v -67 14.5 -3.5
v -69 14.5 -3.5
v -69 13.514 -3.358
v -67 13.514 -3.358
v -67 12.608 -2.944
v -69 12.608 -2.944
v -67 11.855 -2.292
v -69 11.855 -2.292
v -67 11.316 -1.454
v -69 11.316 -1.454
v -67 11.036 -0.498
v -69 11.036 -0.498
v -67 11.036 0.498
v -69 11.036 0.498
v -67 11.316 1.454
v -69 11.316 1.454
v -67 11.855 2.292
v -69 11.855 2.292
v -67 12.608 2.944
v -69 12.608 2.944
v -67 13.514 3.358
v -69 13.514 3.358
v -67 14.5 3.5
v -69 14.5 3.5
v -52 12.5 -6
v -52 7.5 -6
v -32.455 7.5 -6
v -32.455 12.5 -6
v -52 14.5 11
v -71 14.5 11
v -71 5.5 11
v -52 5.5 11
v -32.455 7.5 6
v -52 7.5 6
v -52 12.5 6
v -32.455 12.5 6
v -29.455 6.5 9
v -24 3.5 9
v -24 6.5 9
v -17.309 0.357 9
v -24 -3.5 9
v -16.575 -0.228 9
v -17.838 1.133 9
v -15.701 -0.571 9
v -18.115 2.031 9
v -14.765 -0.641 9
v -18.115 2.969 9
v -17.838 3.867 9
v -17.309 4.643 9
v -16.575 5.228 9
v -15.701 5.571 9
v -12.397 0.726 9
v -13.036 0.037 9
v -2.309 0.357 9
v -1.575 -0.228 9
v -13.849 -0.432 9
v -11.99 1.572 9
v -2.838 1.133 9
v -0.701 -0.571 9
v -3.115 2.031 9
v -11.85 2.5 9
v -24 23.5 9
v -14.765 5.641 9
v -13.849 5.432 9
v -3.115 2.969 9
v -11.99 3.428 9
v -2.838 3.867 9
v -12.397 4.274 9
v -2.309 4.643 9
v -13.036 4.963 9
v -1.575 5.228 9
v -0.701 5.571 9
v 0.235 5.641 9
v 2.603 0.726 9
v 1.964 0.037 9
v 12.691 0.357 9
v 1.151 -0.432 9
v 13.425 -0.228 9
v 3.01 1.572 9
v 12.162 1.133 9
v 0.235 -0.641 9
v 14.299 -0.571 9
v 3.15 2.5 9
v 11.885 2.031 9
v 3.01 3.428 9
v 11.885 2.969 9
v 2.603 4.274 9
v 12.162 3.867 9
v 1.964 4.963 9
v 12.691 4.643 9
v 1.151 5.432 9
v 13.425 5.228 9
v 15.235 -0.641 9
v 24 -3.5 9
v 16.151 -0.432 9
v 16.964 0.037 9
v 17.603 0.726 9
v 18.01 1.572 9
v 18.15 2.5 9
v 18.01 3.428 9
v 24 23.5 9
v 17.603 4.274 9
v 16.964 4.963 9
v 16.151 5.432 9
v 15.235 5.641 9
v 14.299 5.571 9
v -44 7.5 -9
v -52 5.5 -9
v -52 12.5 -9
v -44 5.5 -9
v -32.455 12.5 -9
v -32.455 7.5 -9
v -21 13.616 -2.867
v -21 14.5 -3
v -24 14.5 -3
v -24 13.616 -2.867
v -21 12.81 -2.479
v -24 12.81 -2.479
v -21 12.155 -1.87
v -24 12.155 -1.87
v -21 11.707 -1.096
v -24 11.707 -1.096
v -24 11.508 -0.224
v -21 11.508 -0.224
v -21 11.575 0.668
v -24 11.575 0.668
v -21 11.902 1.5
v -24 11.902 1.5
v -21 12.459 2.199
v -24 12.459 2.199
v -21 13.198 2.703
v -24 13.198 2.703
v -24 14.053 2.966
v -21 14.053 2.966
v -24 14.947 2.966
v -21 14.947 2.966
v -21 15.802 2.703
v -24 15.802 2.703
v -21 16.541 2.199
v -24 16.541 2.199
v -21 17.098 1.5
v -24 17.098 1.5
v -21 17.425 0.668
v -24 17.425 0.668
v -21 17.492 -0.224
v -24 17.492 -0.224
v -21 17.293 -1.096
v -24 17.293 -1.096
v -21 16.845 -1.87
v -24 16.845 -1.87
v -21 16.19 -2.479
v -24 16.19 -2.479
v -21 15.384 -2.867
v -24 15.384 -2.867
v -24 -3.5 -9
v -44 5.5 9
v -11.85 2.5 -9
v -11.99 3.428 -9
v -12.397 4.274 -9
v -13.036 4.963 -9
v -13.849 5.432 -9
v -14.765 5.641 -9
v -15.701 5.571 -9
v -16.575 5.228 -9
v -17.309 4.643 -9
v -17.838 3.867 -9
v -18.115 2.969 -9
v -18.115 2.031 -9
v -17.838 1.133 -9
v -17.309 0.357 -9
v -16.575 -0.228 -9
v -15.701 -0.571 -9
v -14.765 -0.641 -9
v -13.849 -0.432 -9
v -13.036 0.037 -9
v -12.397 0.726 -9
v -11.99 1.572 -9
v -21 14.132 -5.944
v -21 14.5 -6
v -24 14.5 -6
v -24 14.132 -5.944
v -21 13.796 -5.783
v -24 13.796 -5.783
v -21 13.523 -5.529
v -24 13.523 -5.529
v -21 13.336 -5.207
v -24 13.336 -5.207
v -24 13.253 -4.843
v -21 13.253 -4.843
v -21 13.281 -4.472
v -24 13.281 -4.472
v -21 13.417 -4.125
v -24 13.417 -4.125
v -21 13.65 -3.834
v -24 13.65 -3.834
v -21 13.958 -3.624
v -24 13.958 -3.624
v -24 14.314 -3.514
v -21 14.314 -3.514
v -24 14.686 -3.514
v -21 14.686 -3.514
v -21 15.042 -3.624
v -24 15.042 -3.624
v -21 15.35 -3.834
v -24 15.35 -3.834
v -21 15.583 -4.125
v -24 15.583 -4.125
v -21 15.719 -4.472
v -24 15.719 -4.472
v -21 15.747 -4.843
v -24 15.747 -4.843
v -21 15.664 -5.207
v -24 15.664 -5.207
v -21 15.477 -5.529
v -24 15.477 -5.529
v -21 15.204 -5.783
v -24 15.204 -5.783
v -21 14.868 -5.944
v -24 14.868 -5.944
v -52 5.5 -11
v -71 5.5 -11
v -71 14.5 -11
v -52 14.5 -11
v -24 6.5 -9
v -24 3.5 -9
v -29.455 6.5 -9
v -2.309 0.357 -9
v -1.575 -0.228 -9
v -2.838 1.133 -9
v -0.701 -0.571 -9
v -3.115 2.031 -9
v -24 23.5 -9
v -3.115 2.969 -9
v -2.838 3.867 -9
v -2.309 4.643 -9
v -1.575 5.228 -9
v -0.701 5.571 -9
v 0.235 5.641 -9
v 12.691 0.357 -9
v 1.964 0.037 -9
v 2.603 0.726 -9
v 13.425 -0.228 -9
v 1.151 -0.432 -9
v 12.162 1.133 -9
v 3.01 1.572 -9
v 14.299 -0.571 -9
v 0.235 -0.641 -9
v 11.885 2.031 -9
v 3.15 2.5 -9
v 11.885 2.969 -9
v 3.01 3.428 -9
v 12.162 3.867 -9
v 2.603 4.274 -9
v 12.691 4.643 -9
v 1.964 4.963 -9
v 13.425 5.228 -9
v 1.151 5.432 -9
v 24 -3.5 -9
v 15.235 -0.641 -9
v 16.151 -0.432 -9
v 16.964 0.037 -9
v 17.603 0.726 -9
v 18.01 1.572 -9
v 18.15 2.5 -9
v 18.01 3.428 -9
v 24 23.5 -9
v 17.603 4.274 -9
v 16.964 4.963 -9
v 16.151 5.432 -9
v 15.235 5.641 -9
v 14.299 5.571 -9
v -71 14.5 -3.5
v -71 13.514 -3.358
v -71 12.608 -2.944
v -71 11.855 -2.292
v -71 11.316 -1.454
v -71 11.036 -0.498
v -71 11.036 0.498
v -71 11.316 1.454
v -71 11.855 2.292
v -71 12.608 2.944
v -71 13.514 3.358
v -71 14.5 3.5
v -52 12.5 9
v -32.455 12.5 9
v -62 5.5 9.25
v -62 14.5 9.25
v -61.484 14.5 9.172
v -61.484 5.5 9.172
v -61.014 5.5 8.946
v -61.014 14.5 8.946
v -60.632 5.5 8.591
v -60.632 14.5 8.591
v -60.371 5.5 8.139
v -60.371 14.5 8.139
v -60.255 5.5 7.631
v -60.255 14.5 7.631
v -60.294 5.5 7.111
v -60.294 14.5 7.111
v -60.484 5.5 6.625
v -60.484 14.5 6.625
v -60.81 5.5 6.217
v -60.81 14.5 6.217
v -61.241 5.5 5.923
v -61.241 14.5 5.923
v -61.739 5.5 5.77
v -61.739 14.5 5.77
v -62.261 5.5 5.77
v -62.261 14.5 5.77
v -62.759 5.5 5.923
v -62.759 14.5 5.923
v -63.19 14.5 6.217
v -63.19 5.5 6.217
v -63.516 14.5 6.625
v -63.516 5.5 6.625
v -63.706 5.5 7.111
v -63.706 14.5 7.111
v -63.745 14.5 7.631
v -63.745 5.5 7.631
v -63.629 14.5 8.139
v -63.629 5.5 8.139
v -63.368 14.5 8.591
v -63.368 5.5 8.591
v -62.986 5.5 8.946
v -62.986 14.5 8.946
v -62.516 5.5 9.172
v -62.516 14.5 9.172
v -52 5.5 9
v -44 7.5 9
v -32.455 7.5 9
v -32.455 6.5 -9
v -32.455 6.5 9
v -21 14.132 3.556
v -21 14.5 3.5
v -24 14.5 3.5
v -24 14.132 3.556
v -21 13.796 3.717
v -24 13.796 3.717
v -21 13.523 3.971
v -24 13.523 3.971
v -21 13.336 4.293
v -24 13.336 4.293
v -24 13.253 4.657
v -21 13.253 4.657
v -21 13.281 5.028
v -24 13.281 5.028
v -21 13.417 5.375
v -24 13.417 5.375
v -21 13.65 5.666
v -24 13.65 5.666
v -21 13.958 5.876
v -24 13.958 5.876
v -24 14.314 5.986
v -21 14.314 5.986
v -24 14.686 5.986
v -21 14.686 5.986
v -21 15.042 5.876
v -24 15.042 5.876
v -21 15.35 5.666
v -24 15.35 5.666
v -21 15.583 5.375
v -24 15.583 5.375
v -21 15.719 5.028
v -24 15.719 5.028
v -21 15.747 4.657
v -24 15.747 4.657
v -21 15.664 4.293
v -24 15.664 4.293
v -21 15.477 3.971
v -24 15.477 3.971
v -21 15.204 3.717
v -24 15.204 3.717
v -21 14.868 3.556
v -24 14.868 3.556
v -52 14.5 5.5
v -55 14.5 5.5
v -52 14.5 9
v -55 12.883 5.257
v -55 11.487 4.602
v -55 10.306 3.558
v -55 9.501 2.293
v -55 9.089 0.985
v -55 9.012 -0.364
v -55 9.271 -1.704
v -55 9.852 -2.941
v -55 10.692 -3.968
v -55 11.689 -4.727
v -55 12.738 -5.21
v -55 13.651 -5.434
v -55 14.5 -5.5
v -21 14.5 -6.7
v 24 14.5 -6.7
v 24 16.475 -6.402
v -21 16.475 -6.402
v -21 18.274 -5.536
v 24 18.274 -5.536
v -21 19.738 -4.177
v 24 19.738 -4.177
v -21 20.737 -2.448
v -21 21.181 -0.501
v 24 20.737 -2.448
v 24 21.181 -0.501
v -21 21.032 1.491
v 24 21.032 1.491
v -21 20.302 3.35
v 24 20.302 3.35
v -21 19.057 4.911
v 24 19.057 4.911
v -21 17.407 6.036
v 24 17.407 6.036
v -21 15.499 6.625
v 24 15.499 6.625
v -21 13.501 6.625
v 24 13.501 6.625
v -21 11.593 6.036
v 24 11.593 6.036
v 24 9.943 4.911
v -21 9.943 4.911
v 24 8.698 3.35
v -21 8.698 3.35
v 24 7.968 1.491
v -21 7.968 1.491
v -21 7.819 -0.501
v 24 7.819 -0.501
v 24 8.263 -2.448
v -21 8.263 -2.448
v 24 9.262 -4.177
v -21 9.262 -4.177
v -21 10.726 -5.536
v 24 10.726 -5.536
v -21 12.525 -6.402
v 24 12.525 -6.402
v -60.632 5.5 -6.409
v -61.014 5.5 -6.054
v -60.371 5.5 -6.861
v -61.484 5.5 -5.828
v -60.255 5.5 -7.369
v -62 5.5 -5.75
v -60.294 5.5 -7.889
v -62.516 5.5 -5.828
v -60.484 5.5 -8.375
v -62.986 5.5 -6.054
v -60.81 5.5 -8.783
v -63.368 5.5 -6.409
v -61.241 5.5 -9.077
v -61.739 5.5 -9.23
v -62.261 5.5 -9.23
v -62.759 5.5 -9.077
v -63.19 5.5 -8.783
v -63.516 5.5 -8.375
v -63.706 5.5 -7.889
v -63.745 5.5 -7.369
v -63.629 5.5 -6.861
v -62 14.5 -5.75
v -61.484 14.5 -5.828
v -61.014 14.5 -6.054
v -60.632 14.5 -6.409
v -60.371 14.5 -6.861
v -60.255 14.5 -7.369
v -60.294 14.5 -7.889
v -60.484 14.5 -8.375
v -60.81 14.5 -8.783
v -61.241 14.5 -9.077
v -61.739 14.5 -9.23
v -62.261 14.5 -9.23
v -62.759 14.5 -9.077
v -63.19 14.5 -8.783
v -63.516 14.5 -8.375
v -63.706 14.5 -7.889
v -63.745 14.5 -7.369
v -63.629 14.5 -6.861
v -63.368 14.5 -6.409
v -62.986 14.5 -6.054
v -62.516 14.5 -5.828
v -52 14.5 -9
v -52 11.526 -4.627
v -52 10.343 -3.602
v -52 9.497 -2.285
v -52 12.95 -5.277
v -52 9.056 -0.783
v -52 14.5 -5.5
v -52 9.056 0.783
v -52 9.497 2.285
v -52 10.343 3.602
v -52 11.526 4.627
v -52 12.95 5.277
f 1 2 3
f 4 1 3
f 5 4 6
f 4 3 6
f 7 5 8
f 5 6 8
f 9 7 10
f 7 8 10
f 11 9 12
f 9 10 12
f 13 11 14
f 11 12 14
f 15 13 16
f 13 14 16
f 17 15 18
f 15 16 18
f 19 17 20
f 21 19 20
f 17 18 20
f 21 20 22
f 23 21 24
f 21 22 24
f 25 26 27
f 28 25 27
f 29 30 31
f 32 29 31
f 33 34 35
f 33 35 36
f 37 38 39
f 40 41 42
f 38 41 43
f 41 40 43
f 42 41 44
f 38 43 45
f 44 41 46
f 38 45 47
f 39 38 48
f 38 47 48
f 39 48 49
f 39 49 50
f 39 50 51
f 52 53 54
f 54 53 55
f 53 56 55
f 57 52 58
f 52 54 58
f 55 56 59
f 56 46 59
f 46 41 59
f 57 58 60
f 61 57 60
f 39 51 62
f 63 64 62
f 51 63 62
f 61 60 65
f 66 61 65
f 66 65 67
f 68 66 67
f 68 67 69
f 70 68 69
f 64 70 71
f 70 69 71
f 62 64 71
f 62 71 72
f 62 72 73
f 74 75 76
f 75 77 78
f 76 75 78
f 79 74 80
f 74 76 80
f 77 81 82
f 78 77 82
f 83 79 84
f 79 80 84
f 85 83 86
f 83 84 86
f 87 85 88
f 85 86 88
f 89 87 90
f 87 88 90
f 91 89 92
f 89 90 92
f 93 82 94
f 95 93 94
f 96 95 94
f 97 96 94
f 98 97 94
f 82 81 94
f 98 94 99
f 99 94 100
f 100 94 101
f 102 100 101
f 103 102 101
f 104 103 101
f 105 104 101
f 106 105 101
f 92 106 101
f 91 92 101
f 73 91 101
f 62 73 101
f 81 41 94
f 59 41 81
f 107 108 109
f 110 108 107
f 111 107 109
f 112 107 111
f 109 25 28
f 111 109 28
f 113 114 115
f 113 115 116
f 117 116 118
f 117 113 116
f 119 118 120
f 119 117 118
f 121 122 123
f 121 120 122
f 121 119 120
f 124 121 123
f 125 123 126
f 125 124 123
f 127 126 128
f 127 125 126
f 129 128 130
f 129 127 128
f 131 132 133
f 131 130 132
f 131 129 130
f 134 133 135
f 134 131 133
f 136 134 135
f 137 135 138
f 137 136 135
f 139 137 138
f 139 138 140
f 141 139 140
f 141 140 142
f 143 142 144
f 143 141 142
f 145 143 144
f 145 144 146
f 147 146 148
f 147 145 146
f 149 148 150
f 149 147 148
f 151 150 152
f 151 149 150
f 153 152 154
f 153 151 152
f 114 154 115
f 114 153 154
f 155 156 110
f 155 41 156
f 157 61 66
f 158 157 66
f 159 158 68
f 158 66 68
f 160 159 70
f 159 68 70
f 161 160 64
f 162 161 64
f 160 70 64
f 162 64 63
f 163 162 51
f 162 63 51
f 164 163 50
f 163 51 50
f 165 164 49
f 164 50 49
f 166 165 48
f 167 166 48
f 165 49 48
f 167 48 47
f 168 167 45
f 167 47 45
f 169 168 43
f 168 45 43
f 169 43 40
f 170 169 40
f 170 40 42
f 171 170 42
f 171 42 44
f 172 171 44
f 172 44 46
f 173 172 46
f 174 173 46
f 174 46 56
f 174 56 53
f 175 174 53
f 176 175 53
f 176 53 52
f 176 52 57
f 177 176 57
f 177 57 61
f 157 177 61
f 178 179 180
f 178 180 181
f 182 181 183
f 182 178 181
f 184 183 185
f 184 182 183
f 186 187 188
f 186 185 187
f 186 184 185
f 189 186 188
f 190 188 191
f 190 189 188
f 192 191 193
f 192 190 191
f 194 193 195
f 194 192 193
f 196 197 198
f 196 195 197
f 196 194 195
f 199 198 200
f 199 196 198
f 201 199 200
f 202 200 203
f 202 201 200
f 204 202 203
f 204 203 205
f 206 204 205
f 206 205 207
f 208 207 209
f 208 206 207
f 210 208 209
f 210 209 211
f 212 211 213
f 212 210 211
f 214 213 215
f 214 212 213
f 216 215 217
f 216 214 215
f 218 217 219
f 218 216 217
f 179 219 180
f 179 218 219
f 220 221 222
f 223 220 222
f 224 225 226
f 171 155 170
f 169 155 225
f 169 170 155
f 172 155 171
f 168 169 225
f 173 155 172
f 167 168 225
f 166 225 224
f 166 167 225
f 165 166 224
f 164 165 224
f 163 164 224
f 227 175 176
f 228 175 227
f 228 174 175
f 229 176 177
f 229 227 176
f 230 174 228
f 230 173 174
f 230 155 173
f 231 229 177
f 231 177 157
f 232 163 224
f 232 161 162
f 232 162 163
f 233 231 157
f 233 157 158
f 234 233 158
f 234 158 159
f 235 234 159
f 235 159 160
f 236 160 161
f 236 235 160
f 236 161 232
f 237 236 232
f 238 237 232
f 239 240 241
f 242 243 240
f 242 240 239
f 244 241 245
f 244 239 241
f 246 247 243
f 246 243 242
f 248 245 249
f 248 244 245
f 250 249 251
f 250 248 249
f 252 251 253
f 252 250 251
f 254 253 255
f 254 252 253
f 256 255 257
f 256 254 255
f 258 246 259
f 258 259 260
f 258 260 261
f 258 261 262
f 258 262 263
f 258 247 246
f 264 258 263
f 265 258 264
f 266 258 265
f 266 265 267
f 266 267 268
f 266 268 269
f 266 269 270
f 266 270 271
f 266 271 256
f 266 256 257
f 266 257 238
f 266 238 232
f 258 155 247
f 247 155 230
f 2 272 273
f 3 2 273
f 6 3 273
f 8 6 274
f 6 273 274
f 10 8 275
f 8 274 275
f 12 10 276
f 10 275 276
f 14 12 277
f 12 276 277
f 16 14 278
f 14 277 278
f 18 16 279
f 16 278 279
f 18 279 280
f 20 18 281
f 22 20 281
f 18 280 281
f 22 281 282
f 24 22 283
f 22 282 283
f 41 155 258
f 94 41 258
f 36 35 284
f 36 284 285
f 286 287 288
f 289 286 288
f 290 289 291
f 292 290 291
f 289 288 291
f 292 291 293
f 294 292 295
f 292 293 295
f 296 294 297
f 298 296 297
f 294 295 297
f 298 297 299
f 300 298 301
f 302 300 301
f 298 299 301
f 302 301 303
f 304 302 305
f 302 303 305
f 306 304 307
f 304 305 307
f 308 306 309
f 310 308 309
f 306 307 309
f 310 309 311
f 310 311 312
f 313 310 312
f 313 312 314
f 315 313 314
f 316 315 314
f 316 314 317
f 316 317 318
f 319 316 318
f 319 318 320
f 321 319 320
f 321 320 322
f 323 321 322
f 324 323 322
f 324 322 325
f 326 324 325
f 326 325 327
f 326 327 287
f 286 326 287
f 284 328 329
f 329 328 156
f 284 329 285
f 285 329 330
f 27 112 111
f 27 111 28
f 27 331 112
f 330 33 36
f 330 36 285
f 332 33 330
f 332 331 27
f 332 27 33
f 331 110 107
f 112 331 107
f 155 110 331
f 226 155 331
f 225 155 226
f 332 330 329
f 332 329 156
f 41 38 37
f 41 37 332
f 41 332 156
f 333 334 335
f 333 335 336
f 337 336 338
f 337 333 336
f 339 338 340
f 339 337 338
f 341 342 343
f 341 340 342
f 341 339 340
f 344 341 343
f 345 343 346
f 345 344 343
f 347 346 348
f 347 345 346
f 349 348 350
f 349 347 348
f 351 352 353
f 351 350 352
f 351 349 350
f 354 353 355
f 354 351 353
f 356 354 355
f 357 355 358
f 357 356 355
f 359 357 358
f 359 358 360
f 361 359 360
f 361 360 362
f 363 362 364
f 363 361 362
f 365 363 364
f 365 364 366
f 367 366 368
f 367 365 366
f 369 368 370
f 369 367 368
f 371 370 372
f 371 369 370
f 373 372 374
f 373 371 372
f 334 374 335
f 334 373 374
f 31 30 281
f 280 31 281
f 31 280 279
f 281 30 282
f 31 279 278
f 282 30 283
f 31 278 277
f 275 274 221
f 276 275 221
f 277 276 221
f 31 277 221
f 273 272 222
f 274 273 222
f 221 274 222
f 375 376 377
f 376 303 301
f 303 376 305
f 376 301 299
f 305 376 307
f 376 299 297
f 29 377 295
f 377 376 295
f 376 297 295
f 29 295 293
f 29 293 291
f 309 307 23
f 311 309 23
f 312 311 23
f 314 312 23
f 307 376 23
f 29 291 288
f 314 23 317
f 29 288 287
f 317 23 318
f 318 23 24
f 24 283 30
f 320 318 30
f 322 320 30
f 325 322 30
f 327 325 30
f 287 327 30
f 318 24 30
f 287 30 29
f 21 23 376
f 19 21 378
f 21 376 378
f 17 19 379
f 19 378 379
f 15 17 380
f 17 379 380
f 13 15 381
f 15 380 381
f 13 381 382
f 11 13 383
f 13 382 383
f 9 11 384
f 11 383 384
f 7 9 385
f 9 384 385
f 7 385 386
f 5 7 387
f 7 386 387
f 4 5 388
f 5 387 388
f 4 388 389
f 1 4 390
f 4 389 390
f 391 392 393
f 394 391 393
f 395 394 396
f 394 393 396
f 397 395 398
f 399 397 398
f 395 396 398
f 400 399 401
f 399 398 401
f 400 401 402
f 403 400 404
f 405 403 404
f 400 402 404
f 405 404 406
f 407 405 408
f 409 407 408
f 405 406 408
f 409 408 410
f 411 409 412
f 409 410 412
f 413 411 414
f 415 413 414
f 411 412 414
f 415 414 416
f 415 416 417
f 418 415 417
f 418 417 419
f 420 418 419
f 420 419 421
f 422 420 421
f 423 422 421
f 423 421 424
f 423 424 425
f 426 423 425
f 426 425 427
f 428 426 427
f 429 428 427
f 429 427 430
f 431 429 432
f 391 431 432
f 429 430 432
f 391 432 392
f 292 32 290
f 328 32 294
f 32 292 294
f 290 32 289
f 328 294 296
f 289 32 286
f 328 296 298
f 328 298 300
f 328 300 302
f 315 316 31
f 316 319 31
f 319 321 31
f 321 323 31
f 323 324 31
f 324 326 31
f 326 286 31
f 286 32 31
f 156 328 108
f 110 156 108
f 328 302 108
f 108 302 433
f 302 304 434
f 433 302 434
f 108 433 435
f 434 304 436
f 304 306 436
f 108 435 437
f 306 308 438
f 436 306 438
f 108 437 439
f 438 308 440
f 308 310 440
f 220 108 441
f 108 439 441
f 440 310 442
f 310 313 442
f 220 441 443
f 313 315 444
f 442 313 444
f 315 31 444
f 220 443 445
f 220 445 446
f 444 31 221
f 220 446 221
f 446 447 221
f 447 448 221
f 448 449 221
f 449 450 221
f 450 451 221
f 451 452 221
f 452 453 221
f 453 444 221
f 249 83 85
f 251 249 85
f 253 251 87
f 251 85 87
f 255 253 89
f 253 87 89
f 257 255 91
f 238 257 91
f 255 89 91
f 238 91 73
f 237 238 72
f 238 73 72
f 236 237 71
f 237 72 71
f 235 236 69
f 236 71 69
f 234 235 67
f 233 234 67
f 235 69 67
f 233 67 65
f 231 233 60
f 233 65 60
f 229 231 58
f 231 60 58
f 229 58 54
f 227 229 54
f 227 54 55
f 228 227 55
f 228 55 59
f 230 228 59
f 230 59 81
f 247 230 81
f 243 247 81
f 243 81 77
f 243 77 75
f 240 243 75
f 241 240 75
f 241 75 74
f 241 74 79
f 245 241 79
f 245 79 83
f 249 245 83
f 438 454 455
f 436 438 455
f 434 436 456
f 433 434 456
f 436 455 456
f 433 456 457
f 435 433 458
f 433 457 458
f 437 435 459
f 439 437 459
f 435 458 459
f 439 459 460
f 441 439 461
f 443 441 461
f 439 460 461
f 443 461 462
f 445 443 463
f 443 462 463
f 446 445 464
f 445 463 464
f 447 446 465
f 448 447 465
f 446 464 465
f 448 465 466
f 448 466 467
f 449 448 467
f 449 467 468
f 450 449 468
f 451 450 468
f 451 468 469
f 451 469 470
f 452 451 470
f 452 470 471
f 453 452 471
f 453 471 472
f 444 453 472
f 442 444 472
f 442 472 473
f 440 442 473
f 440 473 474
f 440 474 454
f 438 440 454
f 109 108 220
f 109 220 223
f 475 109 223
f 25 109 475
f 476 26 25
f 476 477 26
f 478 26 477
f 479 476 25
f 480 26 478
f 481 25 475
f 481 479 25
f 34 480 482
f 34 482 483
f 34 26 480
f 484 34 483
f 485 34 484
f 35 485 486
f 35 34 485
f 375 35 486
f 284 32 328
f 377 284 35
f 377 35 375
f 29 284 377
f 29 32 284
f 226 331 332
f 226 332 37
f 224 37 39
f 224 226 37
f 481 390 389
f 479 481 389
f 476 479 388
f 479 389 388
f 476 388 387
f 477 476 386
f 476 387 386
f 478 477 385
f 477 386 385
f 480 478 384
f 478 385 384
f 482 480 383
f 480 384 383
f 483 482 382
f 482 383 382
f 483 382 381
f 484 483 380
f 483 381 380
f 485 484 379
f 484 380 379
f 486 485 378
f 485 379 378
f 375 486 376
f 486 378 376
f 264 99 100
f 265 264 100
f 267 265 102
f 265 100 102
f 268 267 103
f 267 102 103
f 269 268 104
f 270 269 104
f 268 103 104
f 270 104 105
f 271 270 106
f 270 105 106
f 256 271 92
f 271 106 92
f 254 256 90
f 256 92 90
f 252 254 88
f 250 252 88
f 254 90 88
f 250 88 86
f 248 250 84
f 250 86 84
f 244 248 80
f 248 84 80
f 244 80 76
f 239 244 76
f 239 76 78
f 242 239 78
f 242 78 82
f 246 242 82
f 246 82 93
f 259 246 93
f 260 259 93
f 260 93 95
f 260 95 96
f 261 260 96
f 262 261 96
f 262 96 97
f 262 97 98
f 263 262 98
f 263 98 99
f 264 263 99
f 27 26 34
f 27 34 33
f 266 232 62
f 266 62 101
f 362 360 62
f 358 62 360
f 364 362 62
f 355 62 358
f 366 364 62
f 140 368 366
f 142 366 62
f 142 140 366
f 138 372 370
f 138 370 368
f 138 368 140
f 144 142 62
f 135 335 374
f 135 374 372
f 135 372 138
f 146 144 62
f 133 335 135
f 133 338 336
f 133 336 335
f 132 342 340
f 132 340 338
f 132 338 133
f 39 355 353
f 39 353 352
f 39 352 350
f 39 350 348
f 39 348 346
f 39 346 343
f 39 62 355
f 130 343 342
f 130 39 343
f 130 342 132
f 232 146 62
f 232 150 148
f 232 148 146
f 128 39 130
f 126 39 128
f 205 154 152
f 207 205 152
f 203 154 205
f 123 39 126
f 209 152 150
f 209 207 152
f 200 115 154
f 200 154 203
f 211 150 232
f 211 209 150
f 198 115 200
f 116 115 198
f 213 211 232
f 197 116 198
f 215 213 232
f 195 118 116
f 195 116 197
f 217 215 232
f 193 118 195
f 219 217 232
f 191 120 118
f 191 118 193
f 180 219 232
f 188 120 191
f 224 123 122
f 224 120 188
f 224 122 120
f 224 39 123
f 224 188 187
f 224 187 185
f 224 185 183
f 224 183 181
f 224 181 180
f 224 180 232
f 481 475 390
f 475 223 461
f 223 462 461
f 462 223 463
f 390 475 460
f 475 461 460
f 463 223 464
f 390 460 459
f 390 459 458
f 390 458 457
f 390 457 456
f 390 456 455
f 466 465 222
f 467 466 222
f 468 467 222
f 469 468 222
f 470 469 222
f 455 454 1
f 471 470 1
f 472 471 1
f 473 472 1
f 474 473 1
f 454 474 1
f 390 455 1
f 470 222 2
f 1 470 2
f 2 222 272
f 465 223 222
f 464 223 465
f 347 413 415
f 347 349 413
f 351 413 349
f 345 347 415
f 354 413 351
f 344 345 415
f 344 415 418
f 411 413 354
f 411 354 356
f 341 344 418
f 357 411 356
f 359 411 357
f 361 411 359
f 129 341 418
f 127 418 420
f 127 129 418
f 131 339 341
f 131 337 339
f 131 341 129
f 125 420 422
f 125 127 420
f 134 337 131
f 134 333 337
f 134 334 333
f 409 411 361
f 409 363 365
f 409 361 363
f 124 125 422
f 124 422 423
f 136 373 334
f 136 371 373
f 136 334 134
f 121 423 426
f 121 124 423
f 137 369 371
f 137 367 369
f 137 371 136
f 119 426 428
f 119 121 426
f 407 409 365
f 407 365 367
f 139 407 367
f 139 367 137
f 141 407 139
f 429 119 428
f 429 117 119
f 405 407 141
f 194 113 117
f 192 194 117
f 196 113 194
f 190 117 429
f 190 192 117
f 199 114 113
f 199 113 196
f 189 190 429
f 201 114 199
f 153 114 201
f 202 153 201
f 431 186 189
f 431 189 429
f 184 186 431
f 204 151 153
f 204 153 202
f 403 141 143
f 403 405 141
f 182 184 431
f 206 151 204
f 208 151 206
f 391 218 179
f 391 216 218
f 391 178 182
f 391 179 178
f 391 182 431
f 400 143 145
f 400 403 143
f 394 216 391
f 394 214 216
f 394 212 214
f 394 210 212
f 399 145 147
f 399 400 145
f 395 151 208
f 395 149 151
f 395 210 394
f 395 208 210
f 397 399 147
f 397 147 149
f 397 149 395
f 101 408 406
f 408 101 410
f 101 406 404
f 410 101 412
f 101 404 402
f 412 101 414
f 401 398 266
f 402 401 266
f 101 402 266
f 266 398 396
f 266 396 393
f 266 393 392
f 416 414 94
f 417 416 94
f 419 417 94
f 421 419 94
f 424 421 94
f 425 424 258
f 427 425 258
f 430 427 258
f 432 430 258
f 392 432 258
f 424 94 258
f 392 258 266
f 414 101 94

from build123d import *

# Parameters (mm, degrees)
SKETCH_1_W           = 48
SKETCH_1_H           = 18
EXTRUDE_1_DEPTH      = 3.5
SKETCH_6_W           = 18
SKETCH_6_H           = 9
EXTRUDE_4_DEPTH      = 25
SKETCH_7_R           = 3.5
CUT_EXTRUDE_1_DEPTH  = 2
SKETCH_9_R           = 5.5
CUT_EXTRUDE_4_DEPTH  = 3
EXTRUDE_5_OUTLINE_W  = 48
EXTRUDE_5_OUTLINE_H  = 18
EXTRUDE_5_DEPTH      = 20
CUT_EXTRUDE_7_REACH  = 98.344
SKETCH_13_R          = 3
SKETCH_13_R_2        = 1.25
SKETCH_15_R          = 6.7
CUT_EXTRUDE_8_DEPTH  = 45
SKETCH_16_R          = 3.15
CUT_EXTRUDE_9_DEPTH  = 76.081622399
EXTRUDE_6_REACH      = 56.196
SKETCH_17_W          = 18
SKETCH_17_H          = 3
SKETCH_18_W          = 14.545454545
SKETCH_18_H          = 18
EXTRUDE_7_DEPTH      = 2
SKETCH_19_W          = 22.545454545
SKETCH_19_H          = 18
CUT_EXTRUDE_11_DEPTH = 7
SKETCH_20_W          = 19.545454545
SKETCH_20_H          = 3
EXTRUDE_8_DEPTH      = 5
SKETCH_21_W          = 17
SKETCH_21_H          = 9
EXTRUDE_9_DEPTH      = 2
SKETCH_22_R          = 1.75
CUT_EXTRUDE_12_DEPTH = 73.152616166
SKETCH_24_W          = 3
SKETCH_24_H          = 18
CUT_EXTRUDE_13_DEPTH = 1
EXTRUDE_START        = 2
EXTRUDE_10_DEPTH     = 2


with BuildPart() as part:
    # 草圖1 → 填料-伸長1 (new, symmetric)
    with BuildSketch(Plane(origin=(0, 0, 0), x_dir=(1, 0, 0), z_dir=(0, 1, 0))):
        Rectangle(SKETCH_1_W, SKETCH_1_H)
    extrude(amount=EXTRUDE_1_DEPTH, both=True)

    # Sketch 3D_3 → Loft 1 section 0
    with BuildSketch(Plane(origin=(-44, 14.5, -9), x_dir=(0, -0.447213595499958, 0.894427190999916), z_dir=(-1, 0, 0))):
        with BuildLine():
            Line((0, 0), (16.099689438, 8.049844719))
            Line((16.099689438, 8.049844719), (20.124611797, 0))
            Line((20.124611797, 0), (4.024922359, -8.049844719))
            Line((4.024922359, -8.049844719), (0, 0))
        make_face()
    # 草圖5 → Loft 1 section 1
    with BuildSketch(Plane.ZY.offset(24)):
        with BuildLine():
            Line((-9, 3.5), (9, 3.5))
            Line((9, 3.5), (9, -3.5))
            Line((9, -3.5), (-9, -3.5))
            Line((-9, -3.5), (-9, 3.5))
        make_face()
    loft()

    # 草圖6 → 填料-伸長4 (add)
    with BuildSketch(Plane.ZY.offset(44)):
        with Locations((0, 10)):
            Rectangle(SKETCH_6_W, SKETCH_6_H)
    extrude(amount=EXTRUDE_4_DEPTH)

    # 草圖7 → 除料-伸長1 (cut)
    with BuildSketch(Plane.ZY.offset(69)):
        with Locations((0, 14.5)):
            Circle(SKETCH_7_R)
    extrude(amount=-CUT_EXTRUDE_1_DEPTH, mode=Mode.SUBTRACT)

    # Loft 1 2: read off the stored shape, not the designer's step
    # Loft 1 2: loft between two sections, ruled curve by curve
    loft_1_2_from = [
        Edge.make_bspline([(-67, 14.5, 3.5), (-67, 12.75, 3.5), (-67, 11, 2.333333333), (-67, 11, -2.333333333), (-67, 12.75, -3.5), (-67, 14.5, -3.5)], [0, 0, 0, 0, 0.5, 0.5, 1, 1, 1, 1], 3, [1, 0.666666667, 0.5, 0.5, 0.666666667, 1]),
        Edge.make_line((-67, 14.5, -3.5), (-67, 14.5, 3.5)),
    ]
    loft_1_2_to = [
        Edge.make_bspline([(-55, 15.833945938, 5.335783751), (-55, 12.063417219, 6.27841593), (-55, 9, 3.886572043), (-55, 9, -3.886572043), (-55, 12.063417219, -6.27841593), (-55, 15.833945938, -5.335783751)], [0, 0, 0, 0, 0.5, 0.5, 1, 1, 1, 1], 3, [1, 0.552953065, 0.4111804, 0.4111804, 0.552953065, 1]),
        Edge.make_line((-55, 15.833945938, -5.335783751), (-55, 15.833945938, 5.335783751)),
    ]
    loft_1_2 = Solid(Shell([*[Face.make_surface_from_curves(loft_1_2_from[k], loft_1_2_to[k]) for k in range(2)], Face(Wire(loft_1_2_from)), Face(Wire(loft_1_2_to))]))
    add(loft_1_2, mode=Mode.SUBTRACT)

    # 草圖9 → 除料-伸長4 (cut)
    with BuildSketch(Plane.ZY.offset(55)):
        with Locations((3.554e-06, 14.500000002)):
            Circle(SKETCH_9_R)
    extrude(amount=-CUT_EXTRUDE_4_DEPTH, mode=Mode.SUBTRACT)

    # 填料-伸長5: read off the stored shape, not the designer's step
    # 填料-伸長5 outline → 填料-伸長5 (add)
    with BuildSketch(Plane(origin=(0, 3.5, 0), x_dir=(1, 0, 0), z_dir=(0, 1, 0))):
        Rectangle(EXTRUDE_5_OUTLINE_W, EXTRUDE_5_OUTLINE_H)
    extrude(amount=EXTRUDE_5_DEPTH)

    # 草圖13 → 除料-伸長7 (cut, up to next)
    with BuildSketch(Plane.ZY.offset(-24), mode=Mode.PRIVATE) as cut_extrude_7_sk1:
        with Locations(Location((0, 14.5, 0), (0, 0, 180))):
            Circle(SKETCH_13_R)
    cut_extrude_7_tool1 = extrude(cut_extrude_7_sk1.sketch, amount=CUT_EXTRUDE_7_REACH, mode=Mode.PRIVATE) & part.part
    # 草圖13 → 除料-伸長7 (cut, up to next)
    with BuildSketch(Plane.ZY.offset(-24), mode=Mode.PRIVATE) as cut_extrude_7_sk2:
        with Locations(Location((-4.75, 14.5, 0), (0, 0, 180))):
            Circle(SKETCH_13_R_2)
    cut_extrude_7_tool2 = extrude(cut_extrude_7_sk2.sketch, amount=CUT_EXTRUDE_7_REACH, mode=Mode.PRIVATE) & part.part
    # 草圖13 → 除料-伸長7 (cut, up to next)
    with BuildSketch(Plane.ZY.offset(-24), mode=Mode.PRIVATE) as cut_extrude_7_sk3:
        with Locations(Location((4.75, 14.5, 0), (0, 0, 180))):
            Circle(SKETCH_13_R_2)
    cut_extrude_7_tool3 = extrude(cut_extrude_7_sk3.sketch, amount=CUT_EXTRUDE_7_REACH, mode=Mode.PRIVATE) & part.part
    add(cut_extrude_7_tool1.solids().sort_by_distance((24, 14.5, 0))[0], mode=Mode.SUBTRACT)
    add(cut_extrude_7_tool2.solids().sort_by_distance((24, 14.5, -4.75))[0], mode=Mode.SUBTRACT)
    add(cut_extrude_7_tool3.solids().sort_by_distance((24, 14.5, 4.75))[0], mode=Mode.SUBTRACT)

    # 草圖15 → 除料-伸長8 (cut)
    with BuildSketch(Plane(origin=(24, 0, 0), x_dir=(0, 0, -1), z_dir=(1, 0, 0))):
        with Locations((0, 14.5)):
            Circle(SKETCH_15_R)
    extrude(amount=-CUT_EXTRUDE_8_DEPTH, mode=Mode.SUBTRACT)

    # 草圖16 → 除料-伸長9 (cut, through all)
    with BuildSketch(Plane.XY.offset(9)):
        with Locations((15, 2.5)):
            Circle(SKETCH_16_R)
        with Locations((0, 2.5)):
            Circle(SKETCH_16_R)
        with Locations((-15, 2.5)):
            Circle(SKETCH_16_R)
    extrude(amount=-CUT_EXTRUDE_9_DEPTH, mode=Mode.SUBTRACT)

    # 填料-伸長6: up to this face of the body (flat: up to its plane)
    extrude_6_end = Plane(part.part.faces().sort_by_distance((-34, 9, 0))[0])
    # 草圖17 → 填料-伸長6 (add, up to the picked face)
    with BuildSketch(Plane.ZY.offset(24), mode=Mode.PRIVATE) as extrude_6_sk1:
        with Locations((0, 5)):
            Rectangle(SKETCH_17_W, SKETCH_17_H)
    extrude_6_tool1 = split(extrude(extrude_6_sk1.sketch, amount=EXTRUDE_6_REACH, mode=Mode.PRIVATE), bisect_by=extrude_6_end, keep=Keep.BOTH, mode=Mode.PRIVATE)
    add(extrude_6_tool1.solids().sort_by(Axis((-24, 5, 0), (-1, 0, 0)))[0])

    # 草圖18 → 填料-伸長7 (add)
    with BuildSketch(Plane.XZ.offset(-5.5)):
        with Locations((-36.727272728, 0)):
            Rectangle(SKETCH_18_W, SKETCH_18_H)
    extrude(amount=-EXTRUDE_7_DEPTH)

    # 草圖19 → 除料-伸長11 (cut)
    with BuildSketch(Plane(origin=(0, 7.5, 0), x_dir=(1, 0, 0), z_dir=(0, 1, 0))):
        with Locations((-40.727272728, 0)):
            Rectangle(SKETCH_19_W, SKETCH_19_H)
    extrude(amount=CUT_EXTRUDE_11_DEPTH, mode=Mode.SUBTRACT)

    # 草圖20 → 填料-伸長8 (add)
    with BuildSketch(Plane(origin=(0, 7.5, 0), x_dir=(1, 0, 0), z_dir=(0, 1, 0))):
        with Locations((-42.227272728, -7.5)):
            Rectangle(SKETCH_20_W, SKETCH_20_H)
    extrude_8 = extrude(amount=EXTRUDE_8_DEPTH)

    # 鏡射1: 填料-伸長8 across plane
    add(extrude_8.mirror(Plane.XY))

    # 草圖21 → 填料-伸長9 (add)
    with BuildSketch(Plane.XY.offset(9)):
        with Locations((-60.5, 10)):
            Rectangle(SKETCH_21_W, SKETCH_21_H)
    extrude_9 = extrude(amount=EXTRUDE_9_DEPTH)

    # 鏡射2: 填料-伸長9 across plane
    add(extrude_9.mirror(Plane.XY))

    # 草圖22 → 除料-伸長12 (cut, through all)
    with BuildSketch(Plane(origin=(0, 14.5, 0), x_dir=(1, 0, 0), z_dir=(0, 1, 0))):
        with Locations(Location((-62, -7.5, 0), (0, 0, 270))):
            Circle(SKETCH_22_R)
        with Locations(Location((-62, 7.5, 0), (0, 0, 270))):
            Circle(SKETCH_22_R)
    extrude(amount=-CUT_EXTRUDE_12_DEPTH, mode=Mode.SUBTRACT)

    # 草圖24 → 除料-伸長13 (cut)
    with BuildSketch(Plane(origin=(0, 7.5, 0), x_dir=(1, 0, 0), z_dir=(0, 1, 0))):
        with Locations((-30.954545455, 0)):
            Rectangle(SKETCH_24_W, SKETCH_24_H)
    extrude(amount=-CUT_EXTRUDE_13_DEPTH, mode=Mode.SUBTRACT)

    # 草圖25 → 填料-伸長10 (add)
    with BuildSketch(Plane.ZY.offset(69).offset(EXTRUDE_START)):
        with BuildLine():
            Line((3.5, 14.5), (11, 14.5))
            Line((11, 14.5), (11, 5.5))
            Line((11, 5.5), (-11, 5.5))
            Line((-11, 5.5), (-11, 14.5))
            Line((-11, 14.5), (-3.5, 14.5))
            ThreePointArc((-3.5, 14.5), (0, 11), (3.5, 14.5))
        make_face()
    extrude(amount=-EXTRUDE_10_DEPTH)


solid = part.part
